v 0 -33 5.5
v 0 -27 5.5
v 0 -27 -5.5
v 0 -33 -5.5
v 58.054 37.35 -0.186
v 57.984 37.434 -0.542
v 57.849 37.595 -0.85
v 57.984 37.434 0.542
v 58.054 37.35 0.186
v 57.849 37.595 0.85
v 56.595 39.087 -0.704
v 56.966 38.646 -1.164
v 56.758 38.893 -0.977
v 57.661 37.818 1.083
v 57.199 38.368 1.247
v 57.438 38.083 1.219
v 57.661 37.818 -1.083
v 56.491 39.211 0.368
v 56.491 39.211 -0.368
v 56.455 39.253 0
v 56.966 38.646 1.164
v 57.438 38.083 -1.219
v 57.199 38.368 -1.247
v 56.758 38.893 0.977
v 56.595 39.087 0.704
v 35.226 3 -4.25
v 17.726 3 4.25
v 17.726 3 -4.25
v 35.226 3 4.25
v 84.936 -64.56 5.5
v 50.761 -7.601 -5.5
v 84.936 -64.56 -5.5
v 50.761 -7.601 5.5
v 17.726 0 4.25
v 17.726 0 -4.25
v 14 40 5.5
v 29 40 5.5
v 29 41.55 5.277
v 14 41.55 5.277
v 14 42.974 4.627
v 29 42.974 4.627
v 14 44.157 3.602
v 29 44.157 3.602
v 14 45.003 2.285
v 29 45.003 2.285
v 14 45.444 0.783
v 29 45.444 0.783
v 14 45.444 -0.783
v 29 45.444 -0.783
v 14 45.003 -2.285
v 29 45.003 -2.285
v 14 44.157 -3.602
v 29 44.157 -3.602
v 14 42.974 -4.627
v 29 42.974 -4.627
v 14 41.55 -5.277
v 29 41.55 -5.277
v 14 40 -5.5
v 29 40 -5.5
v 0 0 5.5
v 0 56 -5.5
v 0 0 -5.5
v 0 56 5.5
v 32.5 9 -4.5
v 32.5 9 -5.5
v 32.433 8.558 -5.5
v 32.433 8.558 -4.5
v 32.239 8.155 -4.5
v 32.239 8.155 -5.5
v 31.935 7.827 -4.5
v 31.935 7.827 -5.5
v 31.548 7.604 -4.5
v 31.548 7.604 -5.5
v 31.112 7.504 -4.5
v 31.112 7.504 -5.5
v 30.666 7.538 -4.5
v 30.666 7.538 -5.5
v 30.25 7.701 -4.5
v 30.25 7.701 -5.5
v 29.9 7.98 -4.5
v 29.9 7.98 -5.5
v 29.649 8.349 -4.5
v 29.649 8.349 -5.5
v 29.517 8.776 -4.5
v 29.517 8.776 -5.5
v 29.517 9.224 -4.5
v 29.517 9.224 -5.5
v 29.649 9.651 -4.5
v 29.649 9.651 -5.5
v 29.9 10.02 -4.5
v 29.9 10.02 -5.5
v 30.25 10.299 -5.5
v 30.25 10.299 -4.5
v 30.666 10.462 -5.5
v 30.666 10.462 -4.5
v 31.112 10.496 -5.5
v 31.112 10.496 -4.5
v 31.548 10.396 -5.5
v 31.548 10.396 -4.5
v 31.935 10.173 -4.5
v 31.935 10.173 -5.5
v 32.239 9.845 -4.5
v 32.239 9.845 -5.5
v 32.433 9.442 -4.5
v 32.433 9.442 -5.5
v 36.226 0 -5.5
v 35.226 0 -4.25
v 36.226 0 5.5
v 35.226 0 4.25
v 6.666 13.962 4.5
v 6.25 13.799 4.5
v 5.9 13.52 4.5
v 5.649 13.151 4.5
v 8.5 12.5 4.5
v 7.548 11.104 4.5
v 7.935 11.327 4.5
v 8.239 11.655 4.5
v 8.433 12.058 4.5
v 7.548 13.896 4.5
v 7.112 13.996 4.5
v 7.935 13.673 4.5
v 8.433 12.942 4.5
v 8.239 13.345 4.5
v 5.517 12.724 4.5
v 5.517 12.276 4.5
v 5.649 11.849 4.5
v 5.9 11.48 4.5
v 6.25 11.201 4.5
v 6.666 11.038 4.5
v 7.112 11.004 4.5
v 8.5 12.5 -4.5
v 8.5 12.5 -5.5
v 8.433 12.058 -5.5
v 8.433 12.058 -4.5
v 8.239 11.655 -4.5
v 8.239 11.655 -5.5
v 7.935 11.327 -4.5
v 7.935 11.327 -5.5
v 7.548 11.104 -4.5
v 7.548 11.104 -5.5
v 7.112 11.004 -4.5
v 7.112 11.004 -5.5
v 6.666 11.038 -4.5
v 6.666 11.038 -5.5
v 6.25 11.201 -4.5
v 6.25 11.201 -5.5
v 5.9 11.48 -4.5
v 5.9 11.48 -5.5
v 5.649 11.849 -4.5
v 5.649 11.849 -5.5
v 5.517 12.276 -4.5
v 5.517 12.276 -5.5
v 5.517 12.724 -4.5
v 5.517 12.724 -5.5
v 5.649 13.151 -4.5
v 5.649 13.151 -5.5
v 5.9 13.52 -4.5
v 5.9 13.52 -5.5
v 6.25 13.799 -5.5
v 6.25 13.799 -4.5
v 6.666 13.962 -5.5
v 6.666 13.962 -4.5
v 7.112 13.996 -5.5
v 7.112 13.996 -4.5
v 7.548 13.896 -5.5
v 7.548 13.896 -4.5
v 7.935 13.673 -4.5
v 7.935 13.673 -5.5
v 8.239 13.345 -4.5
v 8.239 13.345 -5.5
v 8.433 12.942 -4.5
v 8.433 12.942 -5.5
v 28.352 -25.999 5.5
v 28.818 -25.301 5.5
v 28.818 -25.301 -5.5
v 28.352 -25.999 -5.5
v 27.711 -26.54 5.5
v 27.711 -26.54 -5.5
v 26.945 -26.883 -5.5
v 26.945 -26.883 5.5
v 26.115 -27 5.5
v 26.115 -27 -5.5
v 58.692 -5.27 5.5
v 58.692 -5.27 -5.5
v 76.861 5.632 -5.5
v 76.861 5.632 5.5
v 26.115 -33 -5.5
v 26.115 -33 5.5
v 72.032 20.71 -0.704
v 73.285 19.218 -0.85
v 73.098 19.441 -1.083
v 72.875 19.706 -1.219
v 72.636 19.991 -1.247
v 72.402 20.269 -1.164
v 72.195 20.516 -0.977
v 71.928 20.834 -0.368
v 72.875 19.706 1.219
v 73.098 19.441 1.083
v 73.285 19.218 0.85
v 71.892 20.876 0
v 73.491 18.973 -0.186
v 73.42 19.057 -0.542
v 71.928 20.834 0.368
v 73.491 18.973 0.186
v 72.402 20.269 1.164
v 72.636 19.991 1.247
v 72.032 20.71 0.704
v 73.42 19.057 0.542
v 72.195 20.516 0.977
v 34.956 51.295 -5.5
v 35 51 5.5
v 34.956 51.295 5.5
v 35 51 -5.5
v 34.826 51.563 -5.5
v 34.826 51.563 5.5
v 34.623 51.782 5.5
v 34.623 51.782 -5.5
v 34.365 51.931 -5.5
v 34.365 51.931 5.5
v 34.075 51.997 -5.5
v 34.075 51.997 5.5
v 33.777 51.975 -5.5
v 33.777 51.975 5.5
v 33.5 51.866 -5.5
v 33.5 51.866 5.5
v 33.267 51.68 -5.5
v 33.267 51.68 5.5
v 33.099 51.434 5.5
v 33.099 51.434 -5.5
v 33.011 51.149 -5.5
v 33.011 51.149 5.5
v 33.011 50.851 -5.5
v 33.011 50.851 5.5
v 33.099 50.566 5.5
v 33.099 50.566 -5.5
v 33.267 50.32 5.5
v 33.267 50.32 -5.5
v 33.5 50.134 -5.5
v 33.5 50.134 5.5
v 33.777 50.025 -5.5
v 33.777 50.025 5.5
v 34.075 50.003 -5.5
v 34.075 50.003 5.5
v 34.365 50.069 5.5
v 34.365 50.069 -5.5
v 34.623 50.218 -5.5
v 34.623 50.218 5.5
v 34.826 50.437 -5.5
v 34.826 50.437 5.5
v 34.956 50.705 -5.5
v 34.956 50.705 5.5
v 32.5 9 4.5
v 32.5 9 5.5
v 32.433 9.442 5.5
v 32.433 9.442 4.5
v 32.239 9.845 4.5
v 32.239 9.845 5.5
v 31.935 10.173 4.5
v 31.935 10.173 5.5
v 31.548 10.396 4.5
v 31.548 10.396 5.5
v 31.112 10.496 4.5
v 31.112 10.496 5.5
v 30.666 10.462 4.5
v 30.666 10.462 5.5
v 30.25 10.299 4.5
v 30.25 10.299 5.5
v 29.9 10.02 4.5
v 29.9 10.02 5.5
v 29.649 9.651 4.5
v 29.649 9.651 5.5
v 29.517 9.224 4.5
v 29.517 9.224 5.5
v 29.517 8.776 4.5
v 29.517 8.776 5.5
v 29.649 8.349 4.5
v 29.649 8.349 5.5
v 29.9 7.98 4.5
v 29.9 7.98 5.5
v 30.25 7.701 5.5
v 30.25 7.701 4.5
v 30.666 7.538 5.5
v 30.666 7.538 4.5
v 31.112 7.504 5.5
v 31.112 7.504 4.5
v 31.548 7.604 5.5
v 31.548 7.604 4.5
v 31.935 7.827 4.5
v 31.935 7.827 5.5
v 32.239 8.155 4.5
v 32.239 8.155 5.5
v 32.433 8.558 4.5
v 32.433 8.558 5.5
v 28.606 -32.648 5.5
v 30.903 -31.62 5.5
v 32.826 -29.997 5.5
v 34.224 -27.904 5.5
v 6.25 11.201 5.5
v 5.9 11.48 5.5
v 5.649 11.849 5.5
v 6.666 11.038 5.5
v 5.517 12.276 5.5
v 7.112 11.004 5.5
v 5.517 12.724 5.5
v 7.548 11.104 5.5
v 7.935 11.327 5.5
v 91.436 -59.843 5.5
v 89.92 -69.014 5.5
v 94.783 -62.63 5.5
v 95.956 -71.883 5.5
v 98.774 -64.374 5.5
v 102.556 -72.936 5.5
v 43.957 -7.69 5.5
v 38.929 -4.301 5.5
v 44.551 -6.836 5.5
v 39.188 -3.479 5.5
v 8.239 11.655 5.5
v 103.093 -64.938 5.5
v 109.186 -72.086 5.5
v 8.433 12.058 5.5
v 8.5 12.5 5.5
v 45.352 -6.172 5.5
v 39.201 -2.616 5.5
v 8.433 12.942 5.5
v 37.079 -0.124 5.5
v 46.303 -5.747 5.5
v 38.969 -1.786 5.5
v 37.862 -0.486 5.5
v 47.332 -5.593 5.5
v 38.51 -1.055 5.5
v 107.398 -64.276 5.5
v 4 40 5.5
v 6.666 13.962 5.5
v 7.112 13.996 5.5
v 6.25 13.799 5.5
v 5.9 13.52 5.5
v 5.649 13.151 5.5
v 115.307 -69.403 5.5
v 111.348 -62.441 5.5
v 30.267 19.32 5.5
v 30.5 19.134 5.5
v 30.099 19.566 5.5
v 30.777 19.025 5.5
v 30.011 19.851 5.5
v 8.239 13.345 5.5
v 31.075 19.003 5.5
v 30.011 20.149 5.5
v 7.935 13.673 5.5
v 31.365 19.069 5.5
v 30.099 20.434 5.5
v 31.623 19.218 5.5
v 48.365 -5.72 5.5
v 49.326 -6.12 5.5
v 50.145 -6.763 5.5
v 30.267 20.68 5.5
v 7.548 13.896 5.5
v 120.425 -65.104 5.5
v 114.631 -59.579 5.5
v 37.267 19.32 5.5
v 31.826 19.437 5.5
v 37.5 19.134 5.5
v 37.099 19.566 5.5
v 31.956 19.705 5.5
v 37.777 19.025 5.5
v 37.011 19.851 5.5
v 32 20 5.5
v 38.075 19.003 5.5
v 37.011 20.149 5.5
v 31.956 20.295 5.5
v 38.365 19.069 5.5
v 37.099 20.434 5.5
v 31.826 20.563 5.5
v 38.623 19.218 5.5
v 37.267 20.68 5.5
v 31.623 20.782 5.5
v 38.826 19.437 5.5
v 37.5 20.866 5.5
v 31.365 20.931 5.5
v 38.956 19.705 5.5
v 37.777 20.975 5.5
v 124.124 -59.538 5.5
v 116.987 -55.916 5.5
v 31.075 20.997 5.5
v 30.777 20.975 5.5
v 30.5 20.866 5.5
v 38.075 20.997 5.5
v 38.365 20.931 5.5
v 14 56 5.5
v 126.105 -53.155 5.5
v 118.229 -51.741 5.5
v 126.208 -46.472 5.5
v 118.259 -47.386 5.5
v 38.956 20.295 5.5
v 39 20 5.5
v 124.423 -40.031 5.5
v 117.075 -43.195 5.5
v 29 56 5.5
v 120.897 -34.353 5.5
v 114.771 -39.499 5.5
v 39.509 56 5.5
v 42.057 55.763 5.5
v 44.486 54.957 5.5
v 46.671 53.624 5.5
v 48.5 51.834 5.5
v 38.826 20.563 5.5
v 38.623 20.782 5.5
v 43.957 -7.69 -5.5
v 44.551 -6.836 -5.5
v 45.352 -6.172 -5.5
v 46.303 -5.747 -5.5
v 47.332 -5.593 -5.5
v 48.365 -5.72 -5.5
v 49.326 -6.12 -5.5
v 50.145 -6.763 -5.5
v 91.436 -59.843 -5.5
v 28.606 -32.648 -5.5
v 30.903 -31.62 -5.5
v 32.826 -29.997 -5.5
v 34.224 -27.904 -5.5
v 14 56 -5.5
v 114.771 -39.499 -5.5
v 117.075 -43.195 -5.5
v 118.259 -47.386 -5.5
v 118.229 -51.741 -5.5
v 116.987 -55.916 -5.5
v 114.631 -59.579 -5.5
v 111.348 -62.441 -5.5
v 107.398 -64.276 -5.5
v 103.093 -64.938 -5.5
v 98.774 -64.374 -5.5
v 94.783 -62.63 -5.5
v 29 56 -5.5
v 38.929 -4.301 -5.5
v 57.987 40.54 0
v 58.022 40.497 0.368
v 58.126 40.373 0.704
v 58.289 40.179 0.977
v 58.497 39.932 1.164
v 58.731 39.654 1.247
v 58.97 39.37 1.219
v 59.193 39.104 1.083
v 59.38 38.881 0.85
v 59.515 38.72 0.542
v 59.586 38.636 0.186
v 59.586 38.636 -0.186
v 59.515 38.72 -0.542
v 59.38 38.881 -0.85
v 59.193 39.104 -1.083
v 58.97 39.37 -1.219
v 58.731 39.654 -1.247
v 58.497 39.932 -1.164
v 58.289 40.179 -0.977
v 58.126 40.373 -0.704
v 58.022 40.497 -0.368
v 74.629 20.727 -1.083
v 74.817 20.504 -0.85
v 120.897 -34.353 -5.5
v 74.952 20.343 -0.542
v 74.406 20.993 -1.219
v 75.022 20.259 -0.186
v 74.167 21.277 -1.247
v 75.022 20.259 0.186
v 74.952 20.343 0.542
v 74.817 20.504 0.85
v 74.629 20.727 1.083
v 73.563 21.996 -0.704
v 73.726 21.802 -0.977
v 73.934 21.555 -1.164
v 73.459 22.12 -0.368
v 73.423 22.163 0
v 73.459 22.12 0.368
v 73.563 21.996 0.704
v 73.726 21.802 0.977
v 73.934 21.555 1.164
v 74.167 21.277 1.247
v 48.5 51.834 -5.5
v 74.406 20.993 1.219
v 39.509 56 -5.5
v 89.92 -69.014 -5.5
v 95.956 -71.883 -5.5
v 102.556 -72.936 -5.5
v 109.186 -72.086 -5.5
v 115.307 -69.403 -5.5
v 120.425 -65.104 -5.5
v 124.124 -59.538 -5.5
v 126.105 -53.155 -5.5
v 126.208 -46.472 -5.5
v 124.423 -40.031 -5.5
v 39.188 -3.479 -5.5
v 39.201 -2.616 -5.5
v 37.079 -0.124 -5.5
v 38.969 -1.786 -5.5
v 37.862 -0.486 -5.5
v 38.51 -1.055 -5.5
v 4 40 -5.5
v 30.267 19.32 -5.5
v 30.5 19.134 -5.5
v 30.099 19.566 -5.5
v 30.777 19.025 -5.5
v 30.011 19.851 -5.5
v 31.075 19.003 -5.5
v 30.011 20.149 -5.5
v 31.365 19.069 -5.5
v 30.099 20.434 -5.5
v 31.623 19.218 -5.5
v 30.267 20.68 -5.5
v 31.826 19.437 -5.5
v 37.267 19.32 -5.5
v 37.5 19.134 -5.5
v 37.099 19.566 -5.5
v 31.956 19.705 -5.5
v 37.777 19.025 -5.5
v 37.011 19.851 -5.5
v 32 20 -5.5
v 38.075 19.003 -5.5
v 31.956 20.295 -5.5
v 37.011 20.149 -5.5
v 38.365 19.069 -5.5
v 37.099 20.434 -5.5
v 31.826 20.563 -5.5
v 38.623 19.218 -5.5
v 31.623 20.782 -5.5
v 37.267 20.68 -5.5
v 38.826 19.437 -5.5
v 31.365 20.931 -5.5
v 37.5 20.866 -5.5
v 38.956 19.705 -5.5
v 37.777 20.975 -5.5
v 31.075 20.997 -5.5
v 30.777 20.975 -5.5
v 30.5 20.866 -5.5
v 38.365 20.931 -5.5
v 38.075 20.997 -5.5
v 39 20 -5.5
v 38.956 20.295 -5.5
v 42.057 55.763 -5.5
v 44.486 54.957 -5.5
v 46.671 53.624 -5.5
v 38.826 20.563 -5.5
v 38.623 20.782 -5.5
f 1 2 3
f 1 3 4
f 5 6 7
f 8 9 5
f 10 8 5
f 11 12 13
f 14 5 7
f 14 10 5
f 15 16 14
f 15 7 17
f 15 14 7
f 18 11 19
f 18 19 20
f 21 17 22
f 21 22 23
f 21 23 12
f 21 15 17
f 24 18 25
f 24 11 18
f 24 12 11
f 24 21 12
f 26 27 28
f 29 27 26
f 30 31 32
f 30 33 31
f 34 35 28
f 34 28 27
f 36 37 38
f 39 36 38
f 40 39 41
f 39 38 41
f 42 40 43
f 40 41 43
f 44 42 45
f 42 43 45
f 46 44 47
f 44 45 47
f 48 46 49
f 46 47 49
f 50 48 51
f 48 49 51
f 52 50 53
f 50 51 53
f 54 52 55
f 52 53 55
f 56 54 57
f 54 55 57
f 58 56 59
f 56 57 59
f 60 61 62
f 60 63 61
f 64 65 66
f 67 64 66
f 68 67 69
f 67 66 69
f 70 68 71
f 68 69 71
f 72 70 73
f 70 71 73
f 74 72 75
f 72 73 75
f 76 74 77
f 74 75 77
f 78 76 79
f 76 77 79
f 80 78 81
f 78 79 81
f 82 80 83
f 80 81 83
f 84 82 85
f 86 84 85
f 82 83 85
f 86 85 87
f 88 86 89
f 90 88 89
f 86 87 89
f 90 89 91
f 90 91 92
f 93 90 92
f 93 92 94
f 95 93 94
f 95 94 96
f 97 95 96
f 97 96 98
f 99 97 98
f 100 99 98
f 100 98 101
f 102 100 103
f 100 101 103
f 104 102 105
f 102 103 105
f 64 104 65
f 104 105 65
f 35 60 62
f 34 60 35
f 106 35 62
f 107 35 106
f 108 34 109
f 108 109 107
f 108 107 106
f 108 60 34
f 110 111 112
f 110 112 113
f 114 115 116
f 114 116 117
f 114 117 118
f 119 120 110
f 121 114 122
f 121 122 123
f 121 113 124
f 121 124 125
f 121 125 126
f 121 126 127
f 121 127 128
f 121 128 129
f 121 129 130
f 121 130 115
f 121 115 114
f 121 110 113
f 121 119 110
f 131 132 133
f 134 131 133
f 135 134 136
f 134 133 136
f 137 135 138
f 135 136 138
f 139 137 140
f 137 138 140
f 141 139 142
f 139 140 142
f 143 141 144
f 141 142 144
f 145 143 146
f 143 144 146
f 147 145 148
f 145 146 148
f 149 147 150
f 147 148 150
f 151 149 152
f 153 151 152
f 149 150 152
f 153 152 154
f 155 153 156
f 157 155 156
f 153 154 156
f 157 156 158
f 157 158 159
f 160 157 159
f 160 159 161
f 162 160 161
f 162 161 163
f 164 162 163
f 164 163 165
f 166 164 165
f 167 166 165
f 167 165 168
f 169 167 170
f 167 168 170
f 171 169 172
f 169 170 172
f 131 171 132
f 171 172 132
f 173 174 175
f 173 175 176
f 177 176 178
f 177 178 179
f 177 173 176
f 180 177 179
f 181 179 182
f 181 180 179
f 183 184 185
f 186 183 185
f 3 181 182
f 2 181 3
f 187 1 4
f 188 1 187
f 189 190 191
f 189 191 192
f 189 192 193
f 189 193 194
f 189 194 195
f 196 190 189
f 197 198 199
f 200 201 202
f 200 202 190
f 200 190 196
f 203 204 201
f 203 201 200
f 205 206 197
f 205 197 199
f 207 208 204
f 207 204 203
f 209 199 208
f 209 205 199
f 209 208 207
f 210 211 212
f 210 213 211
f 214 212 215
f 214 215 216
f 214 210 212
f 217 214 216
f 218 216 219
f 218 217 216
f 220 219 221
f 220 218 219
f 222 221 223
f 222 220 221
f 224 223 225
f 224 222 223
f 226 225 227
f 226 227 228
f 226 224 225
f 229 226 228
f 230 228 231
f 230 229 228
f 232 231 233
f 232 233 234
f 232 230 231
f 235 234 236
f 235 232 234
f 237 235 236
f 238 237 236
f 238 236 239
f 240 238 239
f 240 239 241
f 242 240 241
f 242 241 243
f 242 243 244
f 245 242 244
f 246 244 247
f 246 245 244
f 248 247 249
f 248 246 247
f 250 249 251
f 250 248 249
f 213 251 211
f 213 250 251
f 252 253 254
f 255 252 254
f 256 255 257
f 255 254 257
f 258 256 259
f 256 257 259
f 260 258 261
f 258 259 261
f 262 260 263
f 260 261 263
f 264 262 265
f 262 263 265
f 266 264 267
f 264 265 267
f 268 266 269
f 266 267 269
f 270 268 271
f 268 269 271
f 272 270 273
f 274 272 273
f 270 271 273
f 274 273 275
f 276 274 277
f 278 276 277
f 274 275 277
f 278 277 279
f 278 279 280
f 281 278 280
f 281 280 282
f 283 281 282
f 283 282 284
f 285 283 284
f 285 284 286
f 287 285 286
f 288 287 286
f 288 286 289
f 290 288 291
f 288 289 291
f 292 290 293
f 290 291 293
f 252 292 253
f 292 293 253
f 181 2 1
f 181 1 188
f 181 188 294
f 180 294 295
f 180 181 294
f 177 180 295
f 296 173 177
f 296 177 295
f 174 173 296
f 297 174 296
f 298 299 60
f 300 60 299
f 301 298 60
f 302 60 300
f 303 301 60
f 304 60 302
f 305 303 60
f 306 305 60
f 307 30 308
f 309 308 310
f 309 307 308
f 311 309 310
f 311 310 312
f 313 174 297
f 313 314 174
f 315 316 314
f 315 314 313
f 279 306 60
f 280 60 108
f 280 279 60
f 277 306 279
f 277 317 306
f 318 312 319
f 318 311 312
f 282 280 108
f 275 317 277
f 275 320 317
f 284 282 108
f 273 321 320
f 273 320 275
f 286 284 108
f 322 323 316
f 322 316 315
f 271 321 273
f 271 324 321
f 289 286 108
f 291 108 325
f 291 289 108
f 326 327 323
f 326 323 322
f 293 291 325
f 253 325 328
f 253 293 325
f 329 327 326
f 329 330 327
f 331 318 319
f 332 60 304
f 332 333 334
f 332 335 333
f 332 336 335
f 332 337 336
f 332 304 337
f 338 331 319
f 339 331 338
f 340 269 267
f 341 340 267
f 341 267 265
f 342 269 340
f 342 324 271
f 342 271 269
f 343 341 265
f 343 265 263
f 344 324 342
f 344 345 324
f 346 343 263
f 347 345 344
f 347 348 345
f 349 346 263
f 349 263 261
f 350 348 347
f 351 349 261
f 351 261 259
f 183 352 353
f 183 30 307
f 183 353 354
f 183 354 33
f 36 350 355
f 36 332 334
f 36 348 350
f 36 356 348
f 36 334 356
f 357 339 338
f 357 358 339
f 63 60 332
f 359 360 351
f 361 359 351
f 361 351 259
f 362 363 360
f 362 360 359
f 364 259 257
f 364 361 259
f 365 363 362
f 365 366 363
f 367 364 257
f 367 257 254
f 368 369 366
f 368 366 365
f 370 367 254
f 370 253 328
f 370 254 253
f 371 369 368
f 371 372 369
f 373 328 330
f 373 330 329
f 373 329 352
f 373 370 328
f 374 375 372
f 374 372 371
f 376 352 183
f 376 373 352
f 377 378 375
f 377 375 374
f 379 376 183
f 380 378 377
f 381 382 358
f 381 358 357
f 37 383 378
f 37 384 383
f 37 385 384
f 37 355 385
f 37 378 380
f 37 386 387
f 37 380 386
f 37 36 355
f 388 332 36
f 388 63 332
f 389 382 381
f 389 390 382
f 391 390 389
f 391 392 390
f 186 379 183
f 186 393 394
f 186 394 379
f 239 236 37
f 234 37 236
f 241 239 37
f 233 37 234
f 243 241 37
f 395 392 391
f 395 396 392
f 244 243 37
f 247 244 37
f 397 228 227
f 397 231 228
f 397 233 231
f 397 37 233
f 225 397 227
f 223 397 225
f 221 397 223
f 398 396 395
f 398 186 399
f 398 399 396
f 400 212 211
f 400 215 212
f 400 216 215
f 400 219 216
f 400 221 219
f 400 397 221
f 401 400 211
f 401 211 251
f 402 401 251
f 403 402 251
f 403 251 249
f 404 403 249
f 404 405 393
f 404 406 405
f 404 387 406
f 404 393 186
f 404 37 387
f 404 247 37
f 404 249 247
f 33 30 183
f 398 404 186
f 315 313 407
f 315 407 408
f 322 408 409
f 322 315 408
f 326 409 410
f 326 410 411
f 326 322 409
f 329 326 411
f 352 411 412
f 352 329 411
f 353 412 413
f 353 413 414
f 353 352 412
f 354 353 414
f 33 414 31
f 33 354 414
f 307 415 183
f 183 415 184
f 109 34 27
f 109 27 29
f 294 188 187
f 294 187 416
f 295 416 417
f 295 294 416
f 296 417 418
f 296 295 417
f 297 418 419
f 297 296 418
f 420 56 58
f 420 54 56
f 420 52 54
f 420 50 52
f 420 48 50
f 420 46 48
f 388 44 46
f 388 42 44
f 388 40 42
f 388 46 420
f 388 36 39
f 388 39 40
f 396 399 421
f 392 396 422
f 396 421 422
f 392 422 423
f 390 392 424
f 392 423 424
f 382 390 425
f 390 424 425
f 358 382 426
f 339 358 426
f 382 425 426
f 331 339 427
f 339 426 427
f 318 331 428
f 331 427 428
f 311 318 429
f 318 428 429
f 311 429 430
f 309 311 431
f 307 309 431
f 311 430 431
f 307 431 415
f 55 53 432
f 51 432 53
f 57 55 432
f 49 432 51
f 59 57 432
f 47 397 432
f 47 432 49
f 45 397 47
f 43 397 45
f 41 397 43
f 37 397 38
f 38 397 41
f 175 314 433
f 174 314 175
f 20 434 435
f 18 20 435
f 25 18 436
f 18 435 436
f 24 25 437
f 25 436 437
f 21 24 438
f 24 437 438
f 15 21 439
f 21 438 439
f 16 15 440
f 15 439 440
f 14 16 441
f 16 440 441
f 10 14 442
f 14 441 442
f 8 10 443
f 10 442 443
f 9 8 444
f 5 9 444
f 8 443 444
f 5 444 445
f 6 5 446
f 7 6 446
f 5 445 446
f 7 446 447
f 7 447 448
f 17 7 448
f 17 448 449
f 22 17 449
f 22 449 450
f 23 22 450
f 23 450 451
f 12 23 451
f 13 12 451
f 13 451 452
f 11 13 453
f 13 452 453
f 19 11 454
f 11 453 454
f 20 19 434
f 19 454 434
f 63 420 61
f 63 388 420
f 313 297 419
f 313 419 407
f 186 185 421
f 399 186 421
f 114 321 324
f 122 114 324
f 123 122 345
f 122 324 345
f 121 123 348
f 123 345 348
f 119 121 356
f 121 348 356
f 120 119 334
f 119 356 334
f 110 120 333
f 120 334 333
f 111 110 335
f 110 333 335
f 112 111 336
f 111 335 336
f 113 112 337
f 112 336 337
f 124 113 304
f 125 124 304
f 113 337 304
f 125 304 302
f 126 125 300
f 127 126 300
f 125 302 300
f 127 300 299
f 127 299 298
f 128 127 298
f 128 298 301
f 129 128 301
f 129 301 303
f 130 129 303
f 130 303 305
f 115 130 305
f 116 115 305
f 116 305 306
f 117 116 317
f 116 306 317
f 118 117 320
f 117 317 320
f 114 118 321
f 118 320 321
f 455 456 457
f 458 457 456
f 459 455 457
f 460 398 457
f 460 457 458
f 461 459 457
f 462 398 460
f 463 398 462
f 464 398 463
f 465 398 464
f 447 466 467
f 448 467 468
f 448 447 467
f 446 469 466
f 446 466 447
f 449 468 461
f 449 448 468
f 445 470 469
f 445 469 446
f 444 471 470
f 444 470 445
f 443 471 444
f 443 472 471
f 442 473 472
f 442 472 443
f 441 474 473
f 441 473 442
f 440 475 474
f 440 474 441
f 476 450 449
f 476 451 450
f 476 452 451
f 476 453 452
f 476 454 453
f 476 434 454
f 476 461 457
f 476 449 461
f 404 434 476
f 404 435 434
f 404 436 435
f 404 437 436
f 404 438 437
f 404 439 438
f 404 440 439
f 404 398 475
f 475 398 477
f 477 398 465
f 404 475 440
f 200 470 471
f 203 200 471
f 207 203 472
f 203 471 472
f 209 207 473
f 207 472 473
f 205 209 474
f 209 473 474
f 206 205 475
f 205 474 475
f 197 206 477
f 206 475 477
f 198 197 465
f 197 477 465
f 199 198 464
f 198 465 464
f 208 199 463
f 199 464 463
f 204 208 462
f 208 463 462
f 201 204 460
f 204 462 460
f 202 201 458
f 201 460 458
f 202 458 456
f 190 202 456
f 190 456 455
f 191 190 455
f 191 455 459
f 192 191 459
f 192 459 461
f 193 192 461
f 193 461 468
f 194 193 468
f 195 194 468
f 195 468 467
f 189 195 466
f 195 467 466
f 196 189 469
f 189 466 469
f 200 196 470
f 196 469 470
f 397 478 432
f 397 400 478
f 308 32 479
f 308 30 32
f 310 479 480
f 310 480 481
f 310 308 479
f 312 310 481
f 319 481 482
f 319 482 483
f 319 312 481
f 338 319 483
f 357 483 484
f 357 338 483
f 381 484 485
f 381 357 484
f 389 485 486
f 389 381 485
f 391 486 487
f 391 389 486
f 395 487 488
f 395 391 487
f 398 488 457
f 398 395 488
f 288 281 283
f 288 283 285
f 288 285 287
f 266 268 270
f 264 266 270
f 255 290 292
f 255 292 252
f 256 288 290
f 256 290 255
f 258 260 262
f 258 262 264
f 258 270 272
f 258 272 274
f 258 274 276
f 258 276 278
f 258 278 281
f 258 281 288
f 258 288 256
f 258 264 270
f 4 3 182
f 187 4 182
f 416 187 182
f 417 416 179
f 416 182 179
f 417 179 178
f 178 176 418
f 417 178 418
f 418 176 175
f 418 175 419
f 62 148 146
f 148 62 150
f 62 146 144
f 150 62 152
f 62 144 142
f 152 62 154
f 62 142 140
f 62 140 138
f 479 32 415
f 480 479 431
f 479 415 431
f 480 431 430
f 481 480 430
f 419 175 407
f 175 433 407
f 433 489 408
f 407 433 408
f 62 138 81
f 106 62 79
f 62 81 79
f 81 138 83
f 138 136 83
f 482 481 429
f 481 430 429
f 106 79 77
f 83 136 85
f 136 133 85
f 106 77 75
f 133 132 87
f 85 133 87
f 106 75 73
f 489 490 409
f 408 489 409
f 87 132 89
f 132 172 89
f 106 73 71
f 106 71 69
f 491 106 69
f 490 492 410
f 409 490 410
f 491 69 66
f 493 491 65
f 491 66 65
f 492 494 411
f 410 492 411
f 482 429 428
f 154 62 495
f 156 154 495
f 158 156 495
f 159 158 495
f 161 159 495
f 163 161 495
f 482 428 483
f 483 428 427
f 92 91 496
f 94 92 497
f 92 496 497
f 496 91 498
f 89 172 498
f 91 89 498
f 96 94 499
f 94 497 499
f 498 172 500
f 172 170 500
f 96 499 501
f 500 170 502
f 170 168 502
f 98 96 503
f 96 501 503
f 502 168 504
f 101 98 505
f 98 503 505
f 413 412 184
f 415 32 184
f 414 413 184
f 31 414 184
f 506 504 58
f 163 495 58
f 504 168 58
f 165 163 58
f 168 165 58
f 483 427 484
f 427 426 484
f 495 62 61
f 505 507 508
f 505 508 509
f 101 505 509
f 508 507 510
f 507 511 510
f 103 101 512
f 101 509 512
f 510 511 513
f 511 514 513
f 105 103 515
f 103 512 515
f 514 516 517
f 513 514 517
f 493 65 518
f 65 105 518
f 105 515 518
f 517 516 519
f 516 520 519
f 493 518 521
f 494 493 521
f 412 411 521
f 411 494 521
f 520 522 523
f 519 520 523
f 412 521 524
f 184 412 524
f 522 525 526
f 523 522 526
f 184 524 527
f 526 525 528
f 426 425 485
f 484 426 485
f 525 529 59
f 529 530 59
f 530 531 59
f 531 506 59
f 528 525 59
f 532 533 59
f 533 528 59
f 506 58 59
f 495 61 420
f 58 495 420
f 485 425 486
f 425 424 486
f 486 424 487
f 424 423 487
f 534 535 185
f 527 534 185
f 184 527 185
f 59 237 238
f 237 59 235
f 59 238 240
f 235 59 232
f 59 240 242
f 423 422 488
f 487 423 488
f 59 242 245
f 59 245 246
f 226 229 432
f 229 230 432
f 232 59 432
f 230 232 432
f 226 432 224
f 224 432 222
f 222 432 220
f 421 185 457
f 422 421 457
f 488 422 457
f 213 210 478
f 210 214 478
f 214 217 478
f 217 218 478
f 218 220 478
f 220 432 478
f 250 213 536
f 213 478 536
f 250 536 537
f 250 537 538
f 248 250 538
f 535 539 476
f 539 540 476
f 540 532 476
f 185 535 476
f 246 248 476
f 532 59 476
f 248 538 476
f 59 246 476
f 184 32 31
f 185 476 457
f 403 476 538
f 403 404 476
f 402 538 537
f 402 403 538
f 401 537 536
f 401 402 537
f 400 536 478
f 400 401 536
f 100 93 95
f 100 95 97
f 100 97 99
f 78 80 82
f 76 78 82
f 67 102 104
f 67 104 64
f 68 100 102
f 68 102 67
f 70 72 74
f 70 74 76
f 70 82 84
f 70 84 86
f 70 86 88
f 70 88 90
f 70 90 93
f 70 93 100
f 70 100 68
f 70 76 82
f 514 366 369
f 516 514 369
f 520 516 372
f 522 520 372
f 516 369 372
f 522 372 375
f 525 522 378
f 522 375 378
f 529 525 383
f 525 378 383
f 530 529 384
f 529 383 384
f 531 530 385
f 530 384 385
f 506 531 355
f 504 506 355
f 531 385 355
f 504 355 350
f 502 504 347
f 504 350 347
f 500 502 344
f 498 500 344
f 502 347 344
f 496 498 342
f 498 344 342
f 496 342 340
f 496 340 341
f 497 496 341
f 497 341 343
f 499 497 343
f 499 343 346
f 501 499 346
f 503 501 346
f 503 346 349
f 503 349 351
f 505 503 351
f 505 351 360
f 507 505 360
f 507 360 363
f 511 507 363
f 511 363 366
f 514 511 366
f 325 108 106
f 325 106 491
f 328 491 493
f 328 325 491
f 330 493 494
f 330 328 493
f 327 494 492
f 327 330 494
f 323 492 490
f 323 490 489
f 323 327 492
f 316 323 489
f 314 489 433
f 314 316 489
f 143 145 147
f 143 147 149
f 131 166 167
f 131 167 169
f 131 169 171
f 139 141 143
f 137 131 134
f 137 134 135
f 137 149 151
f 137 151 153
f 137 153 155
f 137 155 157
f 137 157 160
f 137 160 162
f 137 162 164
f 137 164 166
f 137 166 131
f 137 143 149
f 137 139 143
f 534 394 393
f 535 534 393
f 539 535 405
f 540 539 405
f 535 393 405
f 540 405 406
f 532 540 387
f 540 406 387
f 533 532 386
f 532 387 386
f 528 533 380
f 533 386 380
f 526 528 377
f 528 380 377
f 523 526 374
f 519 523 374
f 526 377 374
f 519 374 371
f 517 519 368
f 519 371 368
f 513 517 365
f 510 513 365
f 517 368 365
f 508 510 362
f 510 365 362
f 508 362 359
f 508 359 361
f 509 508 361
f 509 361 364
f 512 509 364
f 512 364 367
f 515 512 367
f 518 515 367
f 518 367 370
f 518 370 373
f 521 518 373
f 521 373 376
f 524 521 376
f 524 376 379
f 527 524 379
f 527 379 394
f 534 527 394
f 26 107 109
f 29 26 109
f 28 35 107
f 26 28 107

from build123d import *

# Parameters (mm, degrees)
F0_R      = 1
F1_DEPTH  = 5.5
F3_DEPTH  = 25
F4_R      = 1
F5_DEPTH  = 11.001
F6_W      = 17.5
F6_H      = 8.5
F7_DEPTH  = 3
F8_R      = 1.25
F9_DEPTH  = 2
F10_R     = 1.5
F11_DEPTH = 1
F12_R     = 1.5
F13_DEPTH = 1
F15_DEPTH = 25


with BuildPart() as f1:
    # F0 (on Top) → F1 (new body, symmetric)
    with BuildSketch(Plane.XY):
        with BuildLine():
            Line((0, 56), (0, 0))
            Line((0, 0), (36.2259279858, 0))
            ThreePointArc((36.2259279858, 0), (38.7660402441, -1.4038077448), (38.9289329951, -4.3014468563))
            Line((38.9289329951, -4.3014468563), (28.817821884, -25.3014468563))
            ThreePointArc((28.817821884, -25.3014468563), (27.7110091299, -26.5401122582), (26.1148168747, -27))
            Line((26.1148168747, -27), (0, -27))
            Line((0, -27), (0, -33))
            Line((0, -33), (26.1148168747, -33))
            ThreePointArc((26.1148168747, -33), (30.9033936403, -31.6203367747), (34.2238319025, -27.904340569))
            Line((34.2238319025, -27.904340569), (43.9565924234, -7.690145641))
            ThreePointArc((43.9565924234, -7.690145641), (47.3319268627, -5.59281579), (50.7608266635, -7.6013777725))
            Line((50.7608266635, -7.6013777725), (84.9360533184, -64.560088864))
            ThreePointArc((84.9360533184, -64.560088864), (118.0198171676, -67.4369378944), (120.8966661979, -34.3531740452))
            Line((120.8966661979, -34.3531740452), (48.4995788875, 51.8338346577))
            ThreePointArc((48.4995788875, 51.8338346577), (44.4862343011, 54.9569066089), (39.5090393722, 56))
            Line((39.5090393722, 56), (29, 56))
            Line((29, 56), (29, 40))
            Line((29, 40), (14, 40))
            Line((14, 40), (14, 56))
            Line((14, 56), (0, 56))
        make_face()
        with Locations((34, 51)):
            Circle(F0_R, mode=Mode.SUBTRACT)
    extrude(amount=F1_DEPTH, both=True)

    # F2 (on face) → F3 (join)
    with BuildSketch(Plane(origin=(29, 0, 0), x_dir=(0, -1, 0), z_dir=(-1, 0, 0))):
        with BuildLine():
            ThreePointArc((-40, 5.5), (-45.5, 0), (-40, -5.5))
            Line((-40, -5.5), (-40, 5.5))
        make_face()
    extrude(amount=F3_DEPTH)

    # F4 (on face) → F5 (cut, through all)
    with BuildSketch(Plane.XY.offset(5.5)):
        with Locations((31, 20)):
            Circle(F4_R)
        with Locations((38, 20)):
            Circle(F4_R)
    extrude(amount=-F5_DEPTH, mode=Mode.SUBTRACT)

    # F6 (on face) → F7 (cut)
    with BuildSketch(Plane.XZ):
        with Locations((26.4759279858, 0)):
            Rectangle(F6_W, F6_H)
    extrude(amount=-F7_DEPTH, mode=Mode.SUBTRACT)

    # F8 (on face) → F9 (cut)
    with BuildSketch(Plane(origin=(53.9634146341, 45.3292682927, 0), x_dir=(-0.6431920864, 0.7657048648, 0), z_dir=(0.7657048648, 0.6431920864, 0))):
        with Locations((-31.5051259772, 0)):
            Circle(F8_R)
        with Locations((-7.5051259772, 0)):
            Circle(F8_R)
    extrude(amount=-F9_DEPTH, mode=Mode.SUBTRACT)

    # F10 (on face) → F11 (cut)
    with BuildSketch(Plane.XY.offset(5.5)):
        with Locations((7, 12.5)):
            Circle(F10_R)
        with Locations((31, 9)):
            Circle(F10_R)
    extrude(amount=-F11_DEPTH, mode=Mode.SUBTRACT)

    # F12 (on face) → F13 (cut)
    with BuildSketch(Plane(origin=(0, 0, -5.5), x_dir=(1, 0, 0), z_dir=(0, 0, -1))):
        with Locations((7, -12.5)):
            Circle(F12_R)
        with Locations((31, -9)):
            Circle(F12_R)
    extrude(amount=-F13_DEPTH, mode=Mode.SUBTRACT)

    # F14 (on face) → F15 (cut)
    with BuildSketch(Plane(origin=(0, 0, -5.5), x_dir=(1, 0, 0), z_dir=(0, 0, -1))):
        with BuildLine():
            Line((58.6916033415, 5.2701338496), (76.8614300391, -5.6317621689))
            Line((76.8614300391, -5.6317621689), (114.7710272796, 39.4987107366))
            ThreePointArc((114.7710272796, 39.4987107366), (113.0903982462, 61.1263473001), (91.4355349705, 59.8433532312))
            Line((91.4355349705, 59.8433532312), (58.6916033415, 5.2701338496))
        make_face()
    extrude(amount=-F15_DEPTH, mode=Mode.SUBTRACT)


solid = f1.part
